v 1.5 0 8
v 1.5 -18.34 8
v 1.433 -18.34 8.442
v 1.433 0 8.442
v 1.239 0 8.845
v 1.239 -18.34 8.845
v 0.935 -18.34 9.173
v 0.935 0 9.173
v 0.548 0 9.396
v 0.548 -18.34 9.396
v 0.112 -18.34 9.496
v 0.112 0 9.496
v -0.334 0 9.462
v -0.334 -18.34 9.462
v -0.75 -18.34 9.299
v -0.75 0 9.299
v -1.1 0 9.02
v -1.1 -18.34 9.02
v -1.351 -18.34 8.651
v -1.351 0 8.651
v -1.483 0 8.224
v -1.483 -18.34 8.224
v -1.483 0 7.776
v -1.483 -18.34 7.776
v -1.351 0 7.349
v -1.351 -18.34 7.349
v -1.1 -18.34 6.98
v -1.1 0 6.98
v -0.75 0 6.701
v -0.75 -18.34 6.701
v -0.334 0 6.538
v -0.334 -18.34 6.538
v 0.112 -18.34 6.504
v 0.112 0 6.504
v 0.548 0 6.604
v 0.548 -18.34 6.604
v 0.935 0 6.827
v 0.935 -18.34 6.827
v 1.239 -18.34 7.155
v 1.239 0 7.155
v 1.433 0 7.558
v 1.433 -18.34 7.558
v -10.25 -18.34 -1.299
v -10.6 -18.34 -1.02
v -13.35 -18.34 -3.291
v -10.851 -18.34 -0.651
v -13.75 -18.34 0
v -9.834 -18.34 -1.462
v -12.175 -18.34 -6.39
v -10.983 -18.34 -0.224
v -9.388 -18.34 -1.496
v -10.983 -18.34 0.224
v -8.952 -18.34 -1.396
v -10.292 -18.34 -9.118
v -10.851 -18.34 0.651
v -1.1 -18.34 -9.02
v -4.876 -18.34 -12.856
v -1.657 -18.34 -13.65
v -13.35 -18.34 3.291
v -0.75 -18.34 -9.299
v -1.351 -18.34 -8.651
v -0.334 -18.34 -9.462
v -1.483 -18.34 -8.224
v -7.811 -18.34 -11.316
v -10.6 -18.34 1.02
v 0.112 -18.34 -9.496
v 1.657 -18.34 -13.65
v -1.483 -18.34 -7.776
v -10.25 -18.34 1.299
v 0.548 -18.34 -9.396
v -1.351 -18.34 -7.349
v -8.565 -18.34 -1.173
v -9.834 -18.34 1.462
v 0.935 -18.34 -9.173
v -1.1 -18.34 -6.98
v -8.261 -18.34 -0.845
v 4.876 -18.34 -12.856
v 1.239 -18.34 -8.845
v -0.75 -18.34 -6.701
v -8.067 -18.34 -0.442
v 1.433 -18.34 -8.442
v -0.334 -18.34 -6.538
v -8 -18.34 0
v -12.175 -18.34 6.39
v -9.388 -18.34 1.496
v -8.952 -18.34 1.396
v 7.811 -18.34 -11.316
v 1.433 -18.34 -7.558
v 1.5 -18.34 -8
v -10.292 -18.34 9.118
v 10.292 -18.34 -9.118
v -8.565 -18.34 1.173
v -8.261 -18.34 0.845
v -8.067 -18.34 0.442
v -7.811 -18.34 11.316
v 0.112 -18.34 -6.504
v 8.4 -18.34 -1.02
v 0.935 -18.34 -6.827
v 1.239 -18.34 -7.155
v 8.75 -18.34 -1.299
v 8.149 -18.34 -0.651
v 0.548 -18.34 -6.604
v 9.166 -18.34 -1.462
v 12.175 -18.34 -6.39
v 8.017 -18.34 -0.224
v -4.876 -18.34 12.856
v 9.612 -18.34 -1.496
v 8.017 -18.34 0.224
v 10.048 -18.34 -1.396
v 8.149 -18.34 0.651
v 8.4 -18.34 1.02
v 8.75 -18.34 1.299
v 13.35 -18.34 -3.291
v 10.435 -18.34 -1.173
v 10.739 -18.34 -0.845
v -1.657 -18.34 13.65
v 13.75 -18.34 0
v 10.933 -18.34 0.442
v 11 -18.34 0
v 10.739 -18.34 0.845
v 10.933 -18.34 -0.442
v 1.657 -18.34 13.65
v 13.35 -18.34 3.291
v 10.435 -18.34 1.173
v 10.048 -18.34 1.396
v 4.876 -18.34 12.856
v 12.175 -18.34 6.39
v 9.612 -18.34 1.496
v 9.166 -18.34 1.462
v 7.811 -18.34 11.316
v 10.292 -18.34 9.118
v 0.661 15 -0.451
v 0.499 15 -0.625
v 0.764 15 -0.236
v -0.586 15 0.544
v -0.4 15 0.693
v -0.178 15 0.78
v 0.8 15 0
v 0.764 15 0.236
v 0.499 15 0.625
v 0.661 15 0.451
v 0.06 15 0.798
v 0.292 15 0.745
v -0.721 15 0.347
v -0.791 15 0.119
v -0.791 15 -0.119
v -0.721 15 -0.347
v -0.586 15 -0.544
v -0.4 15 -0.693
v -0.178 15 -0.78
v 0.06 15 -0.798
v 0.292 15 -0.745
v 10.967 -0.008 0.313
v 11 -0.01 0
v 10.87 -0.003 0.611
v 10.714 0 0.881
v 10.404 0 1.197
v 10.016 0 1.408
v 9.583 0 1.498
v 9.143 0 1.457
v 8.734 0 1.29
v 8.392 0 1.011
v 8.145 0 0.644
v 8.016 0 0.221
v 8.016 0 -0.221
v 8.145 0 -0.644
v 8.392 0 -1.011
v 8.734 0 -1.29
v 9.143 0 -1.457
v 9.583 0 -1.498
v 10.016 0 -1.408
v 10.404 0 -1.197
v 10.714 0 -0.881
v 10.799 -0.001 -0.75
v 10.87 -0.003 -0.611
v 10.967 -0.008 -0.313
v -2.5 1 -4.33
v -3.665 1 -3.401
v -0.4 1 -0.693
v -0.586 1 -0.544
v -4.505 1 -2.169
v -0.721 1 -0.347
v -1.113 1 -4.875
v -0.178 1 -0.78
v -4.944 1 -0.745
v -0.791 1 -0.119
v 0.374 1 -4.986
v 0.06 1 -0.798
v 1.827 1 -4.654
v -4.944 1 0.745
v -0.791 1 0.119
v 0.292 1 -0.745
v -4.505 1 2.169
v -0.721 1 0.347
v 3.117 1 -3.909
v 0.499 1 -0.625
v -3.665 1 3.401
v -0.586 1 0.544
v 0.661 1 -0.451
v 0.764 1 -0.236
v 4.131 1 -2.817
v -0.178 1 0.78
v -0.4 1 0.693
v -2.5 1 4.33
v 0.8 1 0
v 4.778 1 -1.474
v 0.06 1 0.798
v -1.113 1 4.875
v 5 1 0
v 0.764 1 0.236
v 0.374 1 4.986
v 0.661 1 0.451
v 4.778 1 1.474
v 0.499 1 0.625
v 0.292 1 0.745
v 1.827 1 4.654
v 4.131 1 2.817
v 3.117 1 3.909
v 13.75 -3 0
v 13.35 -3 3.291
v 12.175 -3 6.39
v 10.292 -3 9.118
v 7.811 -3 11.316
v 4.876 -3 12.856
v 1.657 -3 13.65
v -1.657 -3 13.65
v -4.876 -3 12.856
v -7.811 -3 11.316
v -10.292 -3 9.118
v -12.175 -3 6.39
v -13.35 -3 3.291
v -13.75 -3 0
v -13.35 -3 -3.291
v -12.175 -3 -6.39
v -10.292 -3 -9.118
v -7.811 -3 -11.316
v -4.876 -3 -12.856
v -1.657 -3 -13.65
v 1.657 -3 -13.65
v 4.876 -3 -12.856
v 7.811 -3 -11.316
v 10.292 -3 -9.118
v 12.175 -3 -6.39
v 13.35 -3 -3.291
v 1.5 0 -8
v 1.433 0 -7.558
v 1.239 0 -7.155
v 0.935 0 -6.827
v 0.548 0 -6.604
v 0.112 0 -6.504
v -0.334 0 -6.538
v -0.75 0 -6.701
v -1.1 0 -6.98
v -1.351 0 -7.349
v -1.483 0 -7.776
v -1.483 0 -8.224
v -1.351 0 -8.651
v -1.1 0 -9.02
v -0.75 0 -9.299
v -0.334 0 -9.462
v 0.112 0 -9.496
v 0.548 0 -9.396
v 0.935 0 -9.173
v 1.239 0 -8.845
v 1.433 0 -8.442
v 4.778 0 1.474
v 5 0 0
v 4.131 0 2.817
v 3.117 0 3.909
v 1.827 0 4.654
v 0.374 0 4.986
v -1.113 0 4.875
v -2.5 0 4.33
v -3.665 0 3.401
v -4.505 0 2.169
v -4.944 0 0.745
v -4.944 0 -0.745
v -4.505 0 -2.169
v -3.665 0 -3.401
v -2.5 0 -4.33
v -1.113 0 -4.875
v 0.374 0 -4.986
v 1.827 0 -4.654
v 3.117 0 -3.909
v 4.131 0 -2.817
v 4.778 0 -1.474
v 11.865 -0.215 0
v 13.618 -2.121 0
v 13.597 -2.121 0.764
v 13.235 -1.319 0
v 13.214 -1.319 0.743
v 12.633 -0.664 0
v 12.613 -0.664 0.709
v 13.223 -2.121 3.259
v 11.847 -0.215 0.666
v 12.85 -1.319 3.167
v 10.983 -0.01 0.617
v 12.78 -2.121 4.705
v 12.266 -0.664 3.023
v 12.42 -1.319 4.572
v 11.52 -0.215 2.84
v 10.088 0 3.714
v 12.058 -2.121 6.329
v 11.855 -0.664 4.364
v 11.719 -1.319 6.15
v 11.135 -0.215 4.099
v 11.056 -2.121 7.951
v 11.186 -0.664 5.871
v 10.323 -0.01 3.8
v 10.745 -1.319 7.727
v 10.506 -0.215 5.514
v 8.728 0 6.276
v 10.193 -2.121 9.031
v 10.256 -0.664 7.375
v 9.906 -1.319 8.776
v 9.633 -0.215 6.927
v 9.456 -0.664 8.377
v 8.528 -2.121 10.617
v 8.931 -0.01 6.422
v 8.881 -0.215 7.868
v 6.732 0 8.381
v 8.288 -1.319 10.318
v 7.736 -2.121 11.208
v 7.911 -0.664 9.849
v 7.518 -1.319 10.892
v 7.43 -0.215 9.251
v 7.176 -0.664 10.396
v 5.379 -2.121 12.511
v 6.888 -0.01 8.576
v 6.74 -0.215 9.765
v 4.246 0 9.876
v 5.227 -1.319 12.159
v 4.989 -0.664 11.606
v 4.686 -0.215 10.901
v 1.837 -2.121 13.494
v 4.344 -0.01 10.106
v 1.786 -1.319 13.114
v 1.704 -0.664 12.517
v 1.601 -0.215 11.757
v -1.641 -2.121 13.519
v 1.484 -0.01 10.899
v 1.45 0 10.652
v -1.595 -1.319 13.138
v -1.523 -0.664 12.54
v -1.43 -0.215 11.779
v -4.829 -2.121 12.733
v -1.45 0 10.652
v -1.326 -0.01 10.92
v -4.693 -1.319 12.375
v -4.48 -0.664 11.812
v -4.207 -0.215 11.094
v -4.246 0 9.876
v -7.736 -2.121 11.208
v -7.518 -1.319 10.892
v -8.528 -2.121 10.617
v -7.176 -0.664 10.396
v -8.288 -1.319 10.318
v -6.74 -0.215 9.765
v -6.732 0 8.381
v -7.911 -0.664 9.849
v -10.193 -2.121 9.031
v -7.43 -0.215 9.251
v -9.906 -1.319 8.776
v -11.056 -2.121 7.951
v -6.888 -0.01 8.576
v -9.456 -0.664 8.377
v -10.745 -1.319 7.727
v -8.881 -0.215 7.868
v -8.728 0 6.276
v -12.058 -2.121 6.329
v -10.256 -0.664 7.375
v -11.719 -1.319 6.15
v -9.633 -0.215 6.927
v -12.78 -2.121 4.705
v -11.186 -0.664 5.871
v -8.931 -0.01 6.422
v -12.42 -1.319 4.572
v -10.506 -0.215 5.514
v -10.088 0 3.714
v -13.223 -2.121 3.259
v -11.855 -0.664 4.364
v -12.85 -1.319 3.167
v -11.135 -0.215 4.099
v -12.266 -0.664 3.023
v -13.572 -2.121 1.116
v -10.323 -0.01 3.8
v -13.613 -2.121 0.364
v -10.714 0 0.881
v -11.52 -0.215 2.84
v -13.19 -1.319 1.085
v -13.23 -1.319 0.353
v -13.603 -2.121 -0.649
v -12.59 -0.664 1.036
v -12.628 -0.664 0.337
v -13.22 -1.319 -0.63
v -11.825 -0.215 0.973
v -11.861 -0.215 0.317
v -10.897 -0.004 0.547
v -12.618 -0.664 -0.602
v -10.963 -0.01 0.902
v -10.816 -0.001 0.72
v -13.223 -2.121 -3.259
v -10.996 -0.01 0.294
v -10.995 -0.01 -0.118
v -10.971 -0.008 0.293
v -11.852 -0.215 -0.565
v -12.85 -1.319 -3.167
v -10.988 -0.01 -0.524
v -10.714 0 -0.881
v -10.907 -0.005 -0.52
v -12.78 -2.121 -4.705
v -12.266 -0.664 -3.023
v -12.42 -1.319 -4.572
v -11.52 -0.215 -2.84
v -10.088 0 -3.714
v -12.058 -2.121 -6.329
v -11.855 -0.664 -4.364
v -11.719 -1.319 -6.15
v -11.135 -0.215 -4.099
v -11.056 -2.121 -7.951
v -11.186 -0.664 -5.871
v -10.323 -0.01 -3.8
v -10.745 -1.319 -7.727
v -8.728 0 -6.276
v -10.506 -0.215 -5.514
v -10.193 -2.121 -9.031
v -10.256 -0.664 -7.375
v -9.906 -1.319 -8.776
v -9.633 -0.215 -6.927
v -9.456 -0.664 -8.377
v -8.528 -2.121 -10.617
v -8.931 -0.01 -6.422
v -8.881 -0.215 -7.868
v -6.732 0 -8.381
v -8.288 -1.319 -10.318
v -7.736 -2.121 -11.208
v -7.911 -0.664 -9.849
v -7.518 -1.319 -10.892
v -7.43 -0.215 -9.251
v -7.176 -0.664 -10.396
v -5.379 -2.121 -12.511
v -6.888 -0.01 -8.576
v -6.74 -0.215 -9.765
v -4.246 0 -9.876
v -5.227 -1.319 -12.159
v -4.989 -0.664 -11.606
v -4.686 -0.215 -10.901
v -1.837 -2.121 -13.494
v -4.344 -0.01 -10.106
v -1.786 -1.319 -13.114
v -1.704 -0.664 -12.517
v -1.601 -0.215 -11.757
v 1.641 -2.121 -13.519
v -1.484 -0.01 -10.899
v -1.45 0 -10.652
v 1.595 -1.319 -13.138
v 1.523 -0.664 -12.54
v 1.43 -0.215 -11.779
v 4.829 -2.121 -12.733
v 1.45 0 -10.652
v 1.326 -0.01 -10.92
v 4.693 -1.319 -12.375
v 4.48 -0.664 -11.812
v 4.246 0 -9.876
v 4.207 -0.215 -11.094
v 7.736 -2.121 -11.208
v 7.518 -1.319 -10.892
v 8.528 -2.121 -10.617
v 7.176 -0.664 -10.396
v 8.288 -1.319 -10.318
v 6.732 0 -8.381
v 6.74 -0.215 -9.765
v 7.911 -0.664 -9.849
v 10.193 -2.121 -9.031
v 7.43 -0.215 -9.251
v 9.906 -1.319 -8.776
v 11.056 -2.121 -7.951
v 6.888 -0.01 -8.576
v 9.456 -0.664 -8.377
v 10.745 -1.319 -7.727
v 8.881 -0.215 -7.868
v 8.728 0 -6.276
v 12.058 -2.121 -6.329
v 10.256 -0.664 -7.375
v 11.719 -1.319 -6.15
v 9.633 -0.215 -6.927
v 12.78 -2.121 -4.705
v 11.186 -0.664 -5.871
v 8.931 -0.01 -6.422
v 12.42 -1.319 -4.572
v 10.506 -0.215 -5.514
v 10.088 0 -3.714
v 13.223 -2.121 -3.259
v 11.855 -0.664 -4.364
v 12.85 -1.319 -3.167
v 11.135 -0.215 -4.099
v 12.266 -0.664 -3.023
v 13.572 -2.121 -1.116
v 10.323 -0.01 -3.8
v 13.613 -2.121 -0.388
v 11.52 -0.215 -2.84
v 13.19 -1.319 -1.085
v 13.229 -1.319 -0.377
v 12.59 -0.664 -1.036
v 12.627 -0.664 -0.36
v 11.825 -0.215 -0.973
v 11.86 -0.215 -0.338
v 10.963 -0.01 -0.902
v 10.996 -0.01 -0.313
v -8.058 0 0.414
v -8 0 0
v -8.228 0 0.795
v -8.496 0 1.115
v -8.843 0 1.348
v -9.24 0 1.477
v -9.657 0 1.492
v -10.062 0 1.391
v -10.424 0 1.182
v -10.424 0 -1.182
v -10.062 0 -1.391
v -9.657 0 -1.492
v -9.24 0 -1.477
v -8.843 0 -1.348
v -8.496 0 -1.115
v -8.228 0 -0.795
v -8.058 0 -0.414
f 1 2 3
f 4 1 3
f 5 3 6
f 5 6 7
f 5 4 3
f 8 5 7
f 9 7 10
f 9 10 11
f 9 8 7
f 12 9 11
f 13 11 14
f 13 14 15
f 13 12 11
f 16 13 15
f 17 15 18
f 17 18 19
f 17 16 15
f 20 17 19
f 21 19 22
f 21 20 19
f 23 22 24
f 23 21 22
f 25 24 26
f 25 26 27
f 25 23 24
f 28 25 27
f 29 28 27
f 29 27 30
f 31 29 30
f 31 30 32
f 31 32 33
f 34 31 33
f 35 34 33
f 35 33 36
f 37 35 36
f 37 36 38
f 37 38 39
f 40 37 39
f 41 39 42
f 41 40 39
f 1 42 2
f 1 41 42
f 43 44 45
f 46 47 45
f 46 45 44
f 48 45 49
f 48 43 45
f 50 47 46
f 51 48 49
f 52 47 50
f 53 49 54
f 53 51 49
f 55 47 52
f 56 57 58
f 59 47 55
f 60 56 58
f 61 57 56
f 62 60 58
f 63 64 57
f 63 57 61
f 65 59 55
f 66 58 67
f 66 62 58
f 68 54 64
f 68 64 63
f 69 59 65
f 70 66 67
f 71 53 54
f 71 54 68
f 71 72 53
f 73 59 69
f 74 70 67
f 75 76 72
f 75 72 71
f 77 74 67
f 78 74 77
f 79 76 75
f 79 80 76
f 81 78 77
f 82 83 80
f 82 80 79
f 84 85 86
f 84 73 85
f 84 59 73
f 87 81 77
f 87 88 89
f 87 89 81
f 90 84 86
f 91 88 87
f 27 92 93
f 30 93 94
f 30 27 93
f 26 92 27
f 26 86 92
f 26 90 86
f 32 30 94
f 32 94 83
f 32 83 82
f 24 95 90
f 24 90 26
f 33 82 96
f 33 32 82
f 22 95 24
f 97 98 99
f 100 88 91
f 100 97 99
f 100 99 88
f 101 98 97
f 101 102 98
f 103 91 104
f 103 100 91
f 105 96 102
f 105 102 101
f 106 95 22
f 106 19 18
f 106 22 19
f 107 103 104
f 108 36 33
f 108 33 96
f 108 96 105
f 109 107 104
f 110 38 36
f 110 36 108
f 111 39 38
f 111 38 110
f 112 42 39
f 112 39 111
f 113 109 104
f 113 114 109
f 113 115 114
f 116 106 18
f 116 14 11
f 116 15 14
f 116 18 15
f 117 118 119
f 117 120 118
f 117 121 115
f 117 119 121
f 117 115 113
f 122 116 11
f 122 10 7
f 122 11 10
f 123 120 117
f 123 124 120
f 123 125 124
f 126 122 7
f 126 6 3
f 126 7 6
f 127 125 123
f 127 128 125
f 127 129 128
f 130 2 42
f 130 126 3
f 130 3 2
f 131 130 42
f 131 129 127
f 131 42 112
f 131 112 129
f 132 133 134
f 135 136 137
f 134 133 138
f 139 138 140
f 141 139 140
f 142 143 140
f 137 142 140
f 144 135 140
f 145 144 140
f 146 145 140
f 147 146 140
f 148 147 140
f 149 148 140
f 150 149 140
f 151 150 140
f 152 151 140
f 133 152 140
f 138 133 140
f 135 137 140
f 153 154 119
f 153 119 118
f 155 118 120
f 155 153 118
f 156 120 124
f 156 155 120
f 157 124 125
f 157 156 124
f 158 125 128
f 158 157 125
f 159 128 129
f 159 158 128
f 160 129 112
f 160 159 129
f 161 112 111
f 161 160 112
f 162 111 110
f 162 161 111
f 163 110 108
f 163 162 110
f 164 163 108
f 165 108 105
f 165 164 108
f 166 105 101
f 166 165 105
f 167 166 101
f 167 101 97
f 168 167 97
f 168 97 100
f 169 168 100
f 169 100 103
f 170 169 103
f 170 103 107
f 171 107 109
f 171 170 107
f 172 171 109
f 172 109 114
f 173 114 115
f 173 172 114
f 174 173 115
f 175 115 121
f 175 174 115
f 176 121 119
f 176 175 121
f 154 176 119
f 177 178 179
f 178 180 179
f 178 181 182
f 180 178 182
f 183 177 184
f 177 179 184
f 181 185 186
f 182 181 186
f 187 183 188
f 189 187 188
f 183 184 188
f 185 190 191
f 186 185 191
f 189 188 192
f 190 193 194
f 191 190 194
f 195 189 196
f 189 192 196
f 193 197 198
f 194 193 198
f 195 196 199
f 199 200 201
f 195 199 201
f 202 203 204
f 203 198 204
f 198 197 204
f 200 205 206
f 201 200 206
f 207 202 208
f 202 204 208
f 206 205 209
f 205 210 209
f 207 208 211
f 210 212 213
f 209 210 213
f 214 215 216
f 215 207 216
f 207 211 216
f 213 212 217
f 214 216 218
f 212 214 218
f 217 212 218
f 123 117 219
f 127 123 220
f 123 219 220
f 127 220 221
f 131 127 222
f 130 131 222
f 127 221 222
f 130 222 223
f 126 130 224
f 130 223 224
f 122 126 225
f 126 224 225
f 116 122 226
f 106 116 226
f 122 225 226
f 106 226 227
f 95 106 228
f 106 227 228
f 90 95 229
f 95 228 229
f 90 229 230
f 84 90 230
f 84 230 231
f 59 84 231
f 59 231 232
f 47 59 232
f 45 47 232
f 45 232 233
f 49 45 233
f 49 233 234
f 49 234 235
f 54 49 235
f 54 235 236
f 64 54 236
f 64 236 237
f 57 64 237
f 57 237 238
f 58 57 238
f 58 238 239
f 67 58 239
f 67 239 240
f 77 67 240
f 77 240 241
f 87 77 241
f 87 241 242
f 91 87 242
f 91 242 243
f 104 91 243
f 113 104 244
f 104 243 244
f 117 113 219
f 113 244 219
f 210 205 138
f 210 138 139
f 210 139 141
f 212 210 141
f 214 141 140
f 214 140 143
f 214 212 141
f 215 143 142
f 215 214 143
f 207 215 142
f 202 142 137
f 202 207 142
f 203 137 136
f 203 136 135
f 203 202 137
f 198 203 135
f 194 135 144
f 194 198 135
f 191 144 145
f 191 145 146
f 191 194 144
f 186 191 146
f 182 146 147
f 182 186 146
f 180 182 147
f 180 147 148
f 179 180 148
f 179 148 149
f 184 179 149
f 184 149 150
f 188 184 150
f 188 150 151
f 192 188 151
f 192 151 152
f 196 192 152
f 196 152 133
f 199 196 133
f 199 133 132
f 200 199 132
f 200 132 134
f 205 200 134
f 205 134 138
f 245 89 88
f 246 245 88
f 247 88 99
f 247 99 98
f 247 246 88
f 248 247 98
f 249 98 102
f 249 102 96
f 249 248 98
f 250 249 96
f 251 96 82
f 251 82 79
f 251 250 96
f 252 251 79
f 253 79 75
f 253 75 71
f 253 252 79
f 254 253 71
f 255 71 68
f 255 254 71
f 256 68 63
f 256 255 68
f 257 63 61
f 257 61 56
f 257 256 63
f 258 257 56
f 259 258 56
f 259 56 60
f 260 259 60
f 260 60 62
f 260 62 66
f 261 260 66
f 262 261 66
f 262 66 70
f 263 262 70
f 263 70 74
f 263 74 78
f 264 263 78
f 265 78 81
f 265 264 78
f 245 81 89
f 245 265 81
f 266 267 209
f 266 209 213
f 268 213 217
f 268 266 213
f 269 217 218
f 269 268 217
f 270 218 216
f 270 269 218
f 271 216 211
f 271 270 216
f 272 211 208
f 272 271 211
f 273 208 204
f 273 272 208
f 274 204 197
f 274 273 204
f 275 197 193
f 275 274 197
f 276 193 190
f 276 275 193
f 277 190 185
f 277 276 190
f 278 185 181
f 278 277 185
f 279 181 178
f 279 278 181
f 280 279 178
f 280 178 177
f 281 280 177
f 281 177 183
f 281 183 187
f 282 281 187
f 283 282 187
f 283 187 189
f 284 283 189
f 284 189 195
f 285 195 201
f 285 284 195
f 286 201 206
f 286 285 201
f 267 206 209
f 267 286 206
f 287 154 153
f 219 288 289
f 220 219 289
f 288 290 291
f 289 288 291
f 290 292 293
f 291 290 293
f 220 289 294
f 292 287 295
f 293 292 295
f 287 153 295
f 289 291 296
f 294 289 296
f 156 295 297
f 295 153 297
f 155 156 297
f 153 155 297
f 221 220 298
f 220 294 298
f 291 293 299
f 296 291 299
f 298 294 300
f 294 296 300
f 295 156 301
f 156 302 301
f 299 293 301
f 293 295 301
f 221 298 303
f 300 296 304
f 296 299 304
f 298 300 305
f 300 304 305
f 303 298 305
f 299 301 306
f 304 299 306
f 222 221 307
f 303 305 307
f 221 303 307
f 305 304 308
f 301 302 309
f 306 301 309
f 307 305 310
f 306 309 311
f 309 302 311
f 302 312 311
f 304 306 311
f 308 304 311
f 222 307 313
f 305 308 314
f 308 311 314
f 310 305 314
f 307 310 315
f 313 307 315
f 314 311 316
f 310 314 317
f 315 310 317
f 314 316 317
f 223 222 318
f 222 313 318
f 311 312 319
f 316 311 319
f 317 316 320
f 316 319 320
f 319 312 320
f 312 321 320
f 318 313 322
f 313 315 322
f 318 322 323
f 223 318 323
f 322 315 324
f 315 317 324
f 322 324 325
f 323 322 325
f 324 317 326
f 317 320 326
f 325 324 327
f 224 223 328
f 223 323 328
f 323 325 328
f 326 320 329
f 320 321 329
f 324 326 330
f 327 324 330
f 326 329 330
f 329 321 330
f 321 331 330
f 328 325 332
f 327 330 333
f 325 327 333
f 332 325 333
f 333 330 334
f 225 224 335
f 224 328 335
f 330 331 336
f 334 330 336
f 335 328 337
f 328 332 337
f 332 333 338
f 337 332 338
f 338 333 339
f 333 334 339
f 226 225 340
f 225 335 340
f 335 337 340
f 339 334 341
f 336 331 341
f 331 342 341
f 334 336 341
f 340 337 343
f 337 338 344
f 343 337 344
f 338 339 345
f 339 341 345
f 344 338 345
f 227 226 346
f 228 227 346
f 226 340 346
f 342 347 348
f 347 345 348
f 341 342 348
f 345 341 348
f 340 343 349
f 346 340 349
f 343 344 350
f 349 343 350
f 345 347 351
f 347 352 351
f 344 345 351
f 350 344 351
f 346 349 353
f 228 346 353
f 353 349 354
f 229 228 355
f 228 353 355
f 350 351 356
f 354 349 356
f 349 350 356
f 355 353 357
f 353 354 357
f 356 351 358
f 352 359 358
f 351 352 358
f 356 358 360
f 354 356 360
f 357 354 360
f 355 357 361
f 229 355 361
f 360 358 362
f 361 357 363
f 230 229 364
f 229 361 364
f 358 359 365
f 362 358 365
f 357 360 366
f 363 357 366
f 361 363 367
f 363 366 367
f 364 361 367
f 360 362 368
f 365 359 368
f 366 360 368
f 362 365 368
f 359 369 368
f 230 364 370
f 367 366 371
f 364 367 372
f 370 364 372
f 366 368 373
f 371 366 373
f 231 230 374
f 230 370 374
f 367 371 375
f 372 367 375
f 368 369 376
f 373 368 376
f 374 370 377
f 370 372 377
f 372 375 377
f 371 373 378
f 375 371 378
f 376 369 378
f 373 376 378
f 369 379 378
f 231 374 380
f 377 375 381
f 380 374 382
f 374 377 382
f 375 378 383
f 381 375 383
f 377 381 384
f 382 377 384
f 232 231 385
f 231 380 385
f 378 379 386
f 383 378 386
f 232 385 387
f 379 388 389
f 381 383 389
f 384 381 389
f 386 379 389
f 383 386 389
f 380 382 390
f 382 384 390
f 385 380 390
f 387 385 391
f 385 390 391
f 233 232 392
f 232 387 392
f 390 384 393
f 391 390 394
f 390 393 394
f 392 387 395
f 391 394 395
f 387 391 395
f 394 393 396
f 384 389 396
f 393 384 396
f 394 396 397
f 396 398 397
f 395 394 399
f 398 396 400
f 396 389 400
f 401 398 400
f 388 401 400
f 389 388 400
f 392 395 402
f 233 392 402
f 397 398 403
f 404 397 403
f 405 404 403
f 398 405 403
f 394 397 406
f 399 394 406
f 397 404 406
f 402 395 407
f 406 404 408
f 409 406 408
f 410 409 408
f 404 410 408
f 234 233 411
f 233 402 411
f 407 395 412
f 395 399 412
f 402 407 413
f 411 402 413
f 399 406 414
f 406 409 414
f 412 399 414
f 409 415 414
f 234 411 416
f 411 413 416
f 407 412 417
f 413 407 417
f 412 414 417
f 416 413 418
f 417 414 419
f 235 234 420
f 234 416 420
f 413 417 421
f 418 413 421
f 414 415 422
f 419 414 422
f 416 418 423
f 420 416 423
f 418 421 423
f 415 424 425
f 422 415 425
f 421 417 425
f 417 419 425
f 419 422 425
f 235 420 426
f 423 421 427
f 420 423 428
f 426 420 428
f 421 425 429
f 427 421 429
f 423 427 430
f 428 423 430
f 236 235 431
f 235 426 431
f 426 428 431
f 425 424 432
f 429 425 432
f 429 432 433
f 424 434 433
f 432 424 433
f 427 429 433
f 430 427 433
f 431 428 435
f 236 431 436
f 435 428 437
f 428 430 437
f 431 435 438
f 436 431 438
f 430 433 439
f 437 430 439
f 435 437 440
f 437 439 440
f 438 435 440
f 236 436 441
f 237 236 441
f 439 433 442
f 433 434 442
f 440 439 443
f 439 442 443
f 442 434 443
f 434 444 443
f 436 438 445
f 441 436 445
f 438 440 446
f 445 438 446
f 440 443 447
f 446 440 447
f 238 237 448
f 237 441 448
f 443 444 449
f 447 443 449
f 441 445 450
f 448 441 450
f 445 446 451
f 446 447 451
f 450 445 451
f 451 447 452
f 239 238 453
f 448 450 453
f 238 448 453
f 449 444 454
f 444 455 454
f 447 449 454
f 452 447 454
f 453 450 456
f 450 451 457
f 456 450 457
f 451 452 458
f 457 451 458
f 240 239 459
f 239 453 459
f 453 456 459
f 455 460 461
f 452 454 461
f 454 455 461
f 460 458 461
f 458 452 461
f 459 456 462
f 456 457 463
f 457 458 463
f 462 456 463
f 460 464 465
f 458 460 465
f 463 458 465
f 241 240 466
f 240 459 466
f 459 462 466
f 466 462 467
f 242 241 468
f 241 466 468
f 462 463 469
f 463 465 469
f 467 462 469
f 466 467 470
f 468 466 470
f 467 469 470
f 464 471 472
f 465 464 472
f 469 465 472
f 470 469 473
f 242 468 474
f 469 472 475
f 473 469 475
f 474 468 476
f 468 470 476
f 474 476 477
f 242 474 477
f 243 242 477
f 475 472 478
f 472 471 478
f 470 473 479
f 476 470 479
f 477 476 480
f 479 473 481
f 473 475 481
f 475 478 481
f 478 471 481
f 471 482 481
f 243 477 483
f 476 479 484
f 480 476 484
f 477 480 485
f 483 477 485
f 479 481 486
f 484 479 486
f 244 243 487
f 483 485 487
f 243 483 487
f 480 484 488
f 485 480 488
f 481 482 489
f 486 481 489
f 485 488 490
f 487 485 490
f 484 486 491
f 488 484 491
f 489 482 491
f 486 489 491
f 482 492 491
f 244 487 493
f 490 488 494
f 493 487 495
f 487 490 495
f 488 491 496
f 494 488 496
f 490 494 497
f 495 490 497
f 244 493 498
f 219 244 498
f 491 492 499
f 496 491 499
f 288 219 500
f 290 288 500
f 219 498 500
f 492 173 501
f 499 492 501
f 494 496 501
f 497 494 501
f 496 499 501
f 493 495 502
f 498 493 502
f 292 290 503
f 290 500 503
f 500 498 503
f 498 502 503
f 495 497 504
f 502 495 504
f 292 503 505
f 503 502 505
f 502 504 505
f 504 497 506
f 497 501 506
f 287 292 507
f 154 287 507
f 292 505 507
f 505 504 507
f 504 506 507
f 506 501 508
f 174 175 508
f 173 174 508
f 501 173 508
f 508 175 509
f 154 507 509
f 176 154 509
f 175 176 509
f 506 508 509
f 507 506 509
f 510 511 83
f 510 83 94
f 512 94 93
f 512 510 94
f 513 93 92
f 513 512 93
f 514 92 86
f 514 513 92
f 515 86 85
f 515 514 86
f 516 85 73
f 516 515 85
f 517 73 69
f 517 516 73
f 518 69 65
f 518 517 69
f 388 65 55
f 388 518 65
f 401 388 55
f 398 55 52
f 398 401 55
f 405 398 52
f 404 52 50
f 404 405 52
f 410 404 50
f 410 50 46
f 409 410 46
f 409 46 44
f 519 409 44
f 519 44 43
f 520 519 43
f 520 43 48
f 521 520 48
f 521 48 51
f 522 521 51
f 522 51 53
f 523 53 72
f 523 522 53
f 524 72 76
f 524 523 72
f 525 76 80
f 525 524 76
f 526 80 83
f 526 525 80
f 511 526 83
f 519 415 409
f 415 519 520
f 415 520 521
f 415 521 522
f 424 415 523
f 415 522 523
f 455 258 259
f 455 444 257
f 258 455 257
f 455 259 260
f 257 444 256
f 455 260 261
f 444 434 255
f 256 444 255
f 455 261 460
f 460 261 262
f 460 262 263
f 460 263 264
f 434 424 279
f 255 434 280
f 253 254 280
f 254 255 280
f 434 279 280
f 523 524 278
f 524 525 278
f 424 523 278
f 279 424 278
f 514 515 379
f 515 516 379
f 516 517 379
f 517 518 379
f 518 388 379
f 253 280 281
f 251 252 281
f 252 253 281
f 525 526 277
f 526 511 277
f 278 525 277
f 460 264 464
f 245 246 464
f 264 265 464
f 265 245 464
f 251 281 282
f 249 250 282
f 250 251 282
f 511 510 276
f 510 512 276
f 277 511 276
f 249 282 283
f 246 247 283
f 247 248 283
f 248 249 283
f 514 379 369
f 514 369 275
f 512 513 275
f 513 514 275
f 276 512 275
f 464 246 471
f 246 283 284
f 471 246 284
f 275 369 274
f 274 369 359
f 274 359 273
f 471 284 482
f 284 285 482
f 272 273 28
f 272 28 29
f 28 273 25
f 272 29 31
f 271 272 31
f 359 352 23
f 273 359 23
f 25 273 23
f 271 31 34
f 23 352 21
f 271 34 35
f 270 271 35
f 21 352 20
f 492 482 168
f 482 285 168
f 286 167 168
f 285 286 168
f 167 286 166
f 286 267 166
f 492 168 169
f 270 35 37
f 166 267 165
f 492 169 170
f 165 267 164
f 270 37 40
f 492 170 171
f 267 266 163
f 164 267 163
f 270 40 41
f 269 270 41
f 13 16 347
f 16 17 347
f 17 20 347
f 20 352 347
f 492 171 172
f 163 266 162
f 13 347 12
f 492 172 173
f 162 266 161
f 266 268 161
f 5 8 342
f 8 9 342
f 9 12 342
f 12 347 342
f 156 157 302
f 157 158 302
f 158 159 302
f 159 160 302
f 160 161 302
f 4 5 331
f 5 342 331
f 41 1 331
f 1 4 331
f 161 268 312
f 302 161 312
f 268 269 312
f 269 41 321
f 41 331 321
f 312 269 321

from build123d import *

# Parameters (mm, degrees)
F0_R     = 13.75
F0_R_2   = 1.5
F1_DEPTH = 18.34
F2_R     = 5
F3_DEPTH = 1
F4_R     = 0.8
F5_DEPTH = 15


# Not quite as in the source:
# - a fillet or chamfer that OpenCascade refuses, or shapes differently, is made with other operations: its cross-section is extruded or revolved along the edge and cut away or added


with BuildPart() as f1:
    # F0 (on Front) → F1 (new body)
    with BuildSketch(Plane.XZ):
        Circle(F0_R)
        with Locations((0, -8)):
            Circle(F0_R_2, mode=Mode.SUBTRACT)
        with Locations((-9.5, 0)):
            Circle(F0_R_2, mode=Mode.SUBTRACT)
        with Locations((9.5, 0)):
            Circle(F0_R_2, mode=Mode.SUBTRACT)
        with Locations((0, 8)):
            Circle(F0_R_2, mode=Mode.SUBTRACT)
    extrude(amount=F1_DEPTH)

    # F2 (on Front) → F3 (join)
    with BuildSketch(Plane.XZ):
        Circle(F2_R)
    extrude(amount=-F3_DEPTH)

    # F4 (on Front) → F5 (join)
    with BuildSketch(Plane.XZ):
        Circle(F4_R)
    extrude(amount=-F5_DEPTH)

    # F6: fillet of radius 3 on 1 edges, made by hand

    # F6_s1 → F6_t2 (revolve, cut)
    with BuildSketch(Plane.XY):
        with BuildLine():
            ThreePointArc((13.75, -3), (12.8713203436, -0.8786796564), (10.75, 0))
            Line((10.75, 0), (13.75, 0))
            Line((13.75, 0), (13.75, -3))
        make_face()
    revolve(axis=Axis((0, 0, 0), (0, -1, 0)), mode=Mode.SUBTRACT)


solid = f1.part
